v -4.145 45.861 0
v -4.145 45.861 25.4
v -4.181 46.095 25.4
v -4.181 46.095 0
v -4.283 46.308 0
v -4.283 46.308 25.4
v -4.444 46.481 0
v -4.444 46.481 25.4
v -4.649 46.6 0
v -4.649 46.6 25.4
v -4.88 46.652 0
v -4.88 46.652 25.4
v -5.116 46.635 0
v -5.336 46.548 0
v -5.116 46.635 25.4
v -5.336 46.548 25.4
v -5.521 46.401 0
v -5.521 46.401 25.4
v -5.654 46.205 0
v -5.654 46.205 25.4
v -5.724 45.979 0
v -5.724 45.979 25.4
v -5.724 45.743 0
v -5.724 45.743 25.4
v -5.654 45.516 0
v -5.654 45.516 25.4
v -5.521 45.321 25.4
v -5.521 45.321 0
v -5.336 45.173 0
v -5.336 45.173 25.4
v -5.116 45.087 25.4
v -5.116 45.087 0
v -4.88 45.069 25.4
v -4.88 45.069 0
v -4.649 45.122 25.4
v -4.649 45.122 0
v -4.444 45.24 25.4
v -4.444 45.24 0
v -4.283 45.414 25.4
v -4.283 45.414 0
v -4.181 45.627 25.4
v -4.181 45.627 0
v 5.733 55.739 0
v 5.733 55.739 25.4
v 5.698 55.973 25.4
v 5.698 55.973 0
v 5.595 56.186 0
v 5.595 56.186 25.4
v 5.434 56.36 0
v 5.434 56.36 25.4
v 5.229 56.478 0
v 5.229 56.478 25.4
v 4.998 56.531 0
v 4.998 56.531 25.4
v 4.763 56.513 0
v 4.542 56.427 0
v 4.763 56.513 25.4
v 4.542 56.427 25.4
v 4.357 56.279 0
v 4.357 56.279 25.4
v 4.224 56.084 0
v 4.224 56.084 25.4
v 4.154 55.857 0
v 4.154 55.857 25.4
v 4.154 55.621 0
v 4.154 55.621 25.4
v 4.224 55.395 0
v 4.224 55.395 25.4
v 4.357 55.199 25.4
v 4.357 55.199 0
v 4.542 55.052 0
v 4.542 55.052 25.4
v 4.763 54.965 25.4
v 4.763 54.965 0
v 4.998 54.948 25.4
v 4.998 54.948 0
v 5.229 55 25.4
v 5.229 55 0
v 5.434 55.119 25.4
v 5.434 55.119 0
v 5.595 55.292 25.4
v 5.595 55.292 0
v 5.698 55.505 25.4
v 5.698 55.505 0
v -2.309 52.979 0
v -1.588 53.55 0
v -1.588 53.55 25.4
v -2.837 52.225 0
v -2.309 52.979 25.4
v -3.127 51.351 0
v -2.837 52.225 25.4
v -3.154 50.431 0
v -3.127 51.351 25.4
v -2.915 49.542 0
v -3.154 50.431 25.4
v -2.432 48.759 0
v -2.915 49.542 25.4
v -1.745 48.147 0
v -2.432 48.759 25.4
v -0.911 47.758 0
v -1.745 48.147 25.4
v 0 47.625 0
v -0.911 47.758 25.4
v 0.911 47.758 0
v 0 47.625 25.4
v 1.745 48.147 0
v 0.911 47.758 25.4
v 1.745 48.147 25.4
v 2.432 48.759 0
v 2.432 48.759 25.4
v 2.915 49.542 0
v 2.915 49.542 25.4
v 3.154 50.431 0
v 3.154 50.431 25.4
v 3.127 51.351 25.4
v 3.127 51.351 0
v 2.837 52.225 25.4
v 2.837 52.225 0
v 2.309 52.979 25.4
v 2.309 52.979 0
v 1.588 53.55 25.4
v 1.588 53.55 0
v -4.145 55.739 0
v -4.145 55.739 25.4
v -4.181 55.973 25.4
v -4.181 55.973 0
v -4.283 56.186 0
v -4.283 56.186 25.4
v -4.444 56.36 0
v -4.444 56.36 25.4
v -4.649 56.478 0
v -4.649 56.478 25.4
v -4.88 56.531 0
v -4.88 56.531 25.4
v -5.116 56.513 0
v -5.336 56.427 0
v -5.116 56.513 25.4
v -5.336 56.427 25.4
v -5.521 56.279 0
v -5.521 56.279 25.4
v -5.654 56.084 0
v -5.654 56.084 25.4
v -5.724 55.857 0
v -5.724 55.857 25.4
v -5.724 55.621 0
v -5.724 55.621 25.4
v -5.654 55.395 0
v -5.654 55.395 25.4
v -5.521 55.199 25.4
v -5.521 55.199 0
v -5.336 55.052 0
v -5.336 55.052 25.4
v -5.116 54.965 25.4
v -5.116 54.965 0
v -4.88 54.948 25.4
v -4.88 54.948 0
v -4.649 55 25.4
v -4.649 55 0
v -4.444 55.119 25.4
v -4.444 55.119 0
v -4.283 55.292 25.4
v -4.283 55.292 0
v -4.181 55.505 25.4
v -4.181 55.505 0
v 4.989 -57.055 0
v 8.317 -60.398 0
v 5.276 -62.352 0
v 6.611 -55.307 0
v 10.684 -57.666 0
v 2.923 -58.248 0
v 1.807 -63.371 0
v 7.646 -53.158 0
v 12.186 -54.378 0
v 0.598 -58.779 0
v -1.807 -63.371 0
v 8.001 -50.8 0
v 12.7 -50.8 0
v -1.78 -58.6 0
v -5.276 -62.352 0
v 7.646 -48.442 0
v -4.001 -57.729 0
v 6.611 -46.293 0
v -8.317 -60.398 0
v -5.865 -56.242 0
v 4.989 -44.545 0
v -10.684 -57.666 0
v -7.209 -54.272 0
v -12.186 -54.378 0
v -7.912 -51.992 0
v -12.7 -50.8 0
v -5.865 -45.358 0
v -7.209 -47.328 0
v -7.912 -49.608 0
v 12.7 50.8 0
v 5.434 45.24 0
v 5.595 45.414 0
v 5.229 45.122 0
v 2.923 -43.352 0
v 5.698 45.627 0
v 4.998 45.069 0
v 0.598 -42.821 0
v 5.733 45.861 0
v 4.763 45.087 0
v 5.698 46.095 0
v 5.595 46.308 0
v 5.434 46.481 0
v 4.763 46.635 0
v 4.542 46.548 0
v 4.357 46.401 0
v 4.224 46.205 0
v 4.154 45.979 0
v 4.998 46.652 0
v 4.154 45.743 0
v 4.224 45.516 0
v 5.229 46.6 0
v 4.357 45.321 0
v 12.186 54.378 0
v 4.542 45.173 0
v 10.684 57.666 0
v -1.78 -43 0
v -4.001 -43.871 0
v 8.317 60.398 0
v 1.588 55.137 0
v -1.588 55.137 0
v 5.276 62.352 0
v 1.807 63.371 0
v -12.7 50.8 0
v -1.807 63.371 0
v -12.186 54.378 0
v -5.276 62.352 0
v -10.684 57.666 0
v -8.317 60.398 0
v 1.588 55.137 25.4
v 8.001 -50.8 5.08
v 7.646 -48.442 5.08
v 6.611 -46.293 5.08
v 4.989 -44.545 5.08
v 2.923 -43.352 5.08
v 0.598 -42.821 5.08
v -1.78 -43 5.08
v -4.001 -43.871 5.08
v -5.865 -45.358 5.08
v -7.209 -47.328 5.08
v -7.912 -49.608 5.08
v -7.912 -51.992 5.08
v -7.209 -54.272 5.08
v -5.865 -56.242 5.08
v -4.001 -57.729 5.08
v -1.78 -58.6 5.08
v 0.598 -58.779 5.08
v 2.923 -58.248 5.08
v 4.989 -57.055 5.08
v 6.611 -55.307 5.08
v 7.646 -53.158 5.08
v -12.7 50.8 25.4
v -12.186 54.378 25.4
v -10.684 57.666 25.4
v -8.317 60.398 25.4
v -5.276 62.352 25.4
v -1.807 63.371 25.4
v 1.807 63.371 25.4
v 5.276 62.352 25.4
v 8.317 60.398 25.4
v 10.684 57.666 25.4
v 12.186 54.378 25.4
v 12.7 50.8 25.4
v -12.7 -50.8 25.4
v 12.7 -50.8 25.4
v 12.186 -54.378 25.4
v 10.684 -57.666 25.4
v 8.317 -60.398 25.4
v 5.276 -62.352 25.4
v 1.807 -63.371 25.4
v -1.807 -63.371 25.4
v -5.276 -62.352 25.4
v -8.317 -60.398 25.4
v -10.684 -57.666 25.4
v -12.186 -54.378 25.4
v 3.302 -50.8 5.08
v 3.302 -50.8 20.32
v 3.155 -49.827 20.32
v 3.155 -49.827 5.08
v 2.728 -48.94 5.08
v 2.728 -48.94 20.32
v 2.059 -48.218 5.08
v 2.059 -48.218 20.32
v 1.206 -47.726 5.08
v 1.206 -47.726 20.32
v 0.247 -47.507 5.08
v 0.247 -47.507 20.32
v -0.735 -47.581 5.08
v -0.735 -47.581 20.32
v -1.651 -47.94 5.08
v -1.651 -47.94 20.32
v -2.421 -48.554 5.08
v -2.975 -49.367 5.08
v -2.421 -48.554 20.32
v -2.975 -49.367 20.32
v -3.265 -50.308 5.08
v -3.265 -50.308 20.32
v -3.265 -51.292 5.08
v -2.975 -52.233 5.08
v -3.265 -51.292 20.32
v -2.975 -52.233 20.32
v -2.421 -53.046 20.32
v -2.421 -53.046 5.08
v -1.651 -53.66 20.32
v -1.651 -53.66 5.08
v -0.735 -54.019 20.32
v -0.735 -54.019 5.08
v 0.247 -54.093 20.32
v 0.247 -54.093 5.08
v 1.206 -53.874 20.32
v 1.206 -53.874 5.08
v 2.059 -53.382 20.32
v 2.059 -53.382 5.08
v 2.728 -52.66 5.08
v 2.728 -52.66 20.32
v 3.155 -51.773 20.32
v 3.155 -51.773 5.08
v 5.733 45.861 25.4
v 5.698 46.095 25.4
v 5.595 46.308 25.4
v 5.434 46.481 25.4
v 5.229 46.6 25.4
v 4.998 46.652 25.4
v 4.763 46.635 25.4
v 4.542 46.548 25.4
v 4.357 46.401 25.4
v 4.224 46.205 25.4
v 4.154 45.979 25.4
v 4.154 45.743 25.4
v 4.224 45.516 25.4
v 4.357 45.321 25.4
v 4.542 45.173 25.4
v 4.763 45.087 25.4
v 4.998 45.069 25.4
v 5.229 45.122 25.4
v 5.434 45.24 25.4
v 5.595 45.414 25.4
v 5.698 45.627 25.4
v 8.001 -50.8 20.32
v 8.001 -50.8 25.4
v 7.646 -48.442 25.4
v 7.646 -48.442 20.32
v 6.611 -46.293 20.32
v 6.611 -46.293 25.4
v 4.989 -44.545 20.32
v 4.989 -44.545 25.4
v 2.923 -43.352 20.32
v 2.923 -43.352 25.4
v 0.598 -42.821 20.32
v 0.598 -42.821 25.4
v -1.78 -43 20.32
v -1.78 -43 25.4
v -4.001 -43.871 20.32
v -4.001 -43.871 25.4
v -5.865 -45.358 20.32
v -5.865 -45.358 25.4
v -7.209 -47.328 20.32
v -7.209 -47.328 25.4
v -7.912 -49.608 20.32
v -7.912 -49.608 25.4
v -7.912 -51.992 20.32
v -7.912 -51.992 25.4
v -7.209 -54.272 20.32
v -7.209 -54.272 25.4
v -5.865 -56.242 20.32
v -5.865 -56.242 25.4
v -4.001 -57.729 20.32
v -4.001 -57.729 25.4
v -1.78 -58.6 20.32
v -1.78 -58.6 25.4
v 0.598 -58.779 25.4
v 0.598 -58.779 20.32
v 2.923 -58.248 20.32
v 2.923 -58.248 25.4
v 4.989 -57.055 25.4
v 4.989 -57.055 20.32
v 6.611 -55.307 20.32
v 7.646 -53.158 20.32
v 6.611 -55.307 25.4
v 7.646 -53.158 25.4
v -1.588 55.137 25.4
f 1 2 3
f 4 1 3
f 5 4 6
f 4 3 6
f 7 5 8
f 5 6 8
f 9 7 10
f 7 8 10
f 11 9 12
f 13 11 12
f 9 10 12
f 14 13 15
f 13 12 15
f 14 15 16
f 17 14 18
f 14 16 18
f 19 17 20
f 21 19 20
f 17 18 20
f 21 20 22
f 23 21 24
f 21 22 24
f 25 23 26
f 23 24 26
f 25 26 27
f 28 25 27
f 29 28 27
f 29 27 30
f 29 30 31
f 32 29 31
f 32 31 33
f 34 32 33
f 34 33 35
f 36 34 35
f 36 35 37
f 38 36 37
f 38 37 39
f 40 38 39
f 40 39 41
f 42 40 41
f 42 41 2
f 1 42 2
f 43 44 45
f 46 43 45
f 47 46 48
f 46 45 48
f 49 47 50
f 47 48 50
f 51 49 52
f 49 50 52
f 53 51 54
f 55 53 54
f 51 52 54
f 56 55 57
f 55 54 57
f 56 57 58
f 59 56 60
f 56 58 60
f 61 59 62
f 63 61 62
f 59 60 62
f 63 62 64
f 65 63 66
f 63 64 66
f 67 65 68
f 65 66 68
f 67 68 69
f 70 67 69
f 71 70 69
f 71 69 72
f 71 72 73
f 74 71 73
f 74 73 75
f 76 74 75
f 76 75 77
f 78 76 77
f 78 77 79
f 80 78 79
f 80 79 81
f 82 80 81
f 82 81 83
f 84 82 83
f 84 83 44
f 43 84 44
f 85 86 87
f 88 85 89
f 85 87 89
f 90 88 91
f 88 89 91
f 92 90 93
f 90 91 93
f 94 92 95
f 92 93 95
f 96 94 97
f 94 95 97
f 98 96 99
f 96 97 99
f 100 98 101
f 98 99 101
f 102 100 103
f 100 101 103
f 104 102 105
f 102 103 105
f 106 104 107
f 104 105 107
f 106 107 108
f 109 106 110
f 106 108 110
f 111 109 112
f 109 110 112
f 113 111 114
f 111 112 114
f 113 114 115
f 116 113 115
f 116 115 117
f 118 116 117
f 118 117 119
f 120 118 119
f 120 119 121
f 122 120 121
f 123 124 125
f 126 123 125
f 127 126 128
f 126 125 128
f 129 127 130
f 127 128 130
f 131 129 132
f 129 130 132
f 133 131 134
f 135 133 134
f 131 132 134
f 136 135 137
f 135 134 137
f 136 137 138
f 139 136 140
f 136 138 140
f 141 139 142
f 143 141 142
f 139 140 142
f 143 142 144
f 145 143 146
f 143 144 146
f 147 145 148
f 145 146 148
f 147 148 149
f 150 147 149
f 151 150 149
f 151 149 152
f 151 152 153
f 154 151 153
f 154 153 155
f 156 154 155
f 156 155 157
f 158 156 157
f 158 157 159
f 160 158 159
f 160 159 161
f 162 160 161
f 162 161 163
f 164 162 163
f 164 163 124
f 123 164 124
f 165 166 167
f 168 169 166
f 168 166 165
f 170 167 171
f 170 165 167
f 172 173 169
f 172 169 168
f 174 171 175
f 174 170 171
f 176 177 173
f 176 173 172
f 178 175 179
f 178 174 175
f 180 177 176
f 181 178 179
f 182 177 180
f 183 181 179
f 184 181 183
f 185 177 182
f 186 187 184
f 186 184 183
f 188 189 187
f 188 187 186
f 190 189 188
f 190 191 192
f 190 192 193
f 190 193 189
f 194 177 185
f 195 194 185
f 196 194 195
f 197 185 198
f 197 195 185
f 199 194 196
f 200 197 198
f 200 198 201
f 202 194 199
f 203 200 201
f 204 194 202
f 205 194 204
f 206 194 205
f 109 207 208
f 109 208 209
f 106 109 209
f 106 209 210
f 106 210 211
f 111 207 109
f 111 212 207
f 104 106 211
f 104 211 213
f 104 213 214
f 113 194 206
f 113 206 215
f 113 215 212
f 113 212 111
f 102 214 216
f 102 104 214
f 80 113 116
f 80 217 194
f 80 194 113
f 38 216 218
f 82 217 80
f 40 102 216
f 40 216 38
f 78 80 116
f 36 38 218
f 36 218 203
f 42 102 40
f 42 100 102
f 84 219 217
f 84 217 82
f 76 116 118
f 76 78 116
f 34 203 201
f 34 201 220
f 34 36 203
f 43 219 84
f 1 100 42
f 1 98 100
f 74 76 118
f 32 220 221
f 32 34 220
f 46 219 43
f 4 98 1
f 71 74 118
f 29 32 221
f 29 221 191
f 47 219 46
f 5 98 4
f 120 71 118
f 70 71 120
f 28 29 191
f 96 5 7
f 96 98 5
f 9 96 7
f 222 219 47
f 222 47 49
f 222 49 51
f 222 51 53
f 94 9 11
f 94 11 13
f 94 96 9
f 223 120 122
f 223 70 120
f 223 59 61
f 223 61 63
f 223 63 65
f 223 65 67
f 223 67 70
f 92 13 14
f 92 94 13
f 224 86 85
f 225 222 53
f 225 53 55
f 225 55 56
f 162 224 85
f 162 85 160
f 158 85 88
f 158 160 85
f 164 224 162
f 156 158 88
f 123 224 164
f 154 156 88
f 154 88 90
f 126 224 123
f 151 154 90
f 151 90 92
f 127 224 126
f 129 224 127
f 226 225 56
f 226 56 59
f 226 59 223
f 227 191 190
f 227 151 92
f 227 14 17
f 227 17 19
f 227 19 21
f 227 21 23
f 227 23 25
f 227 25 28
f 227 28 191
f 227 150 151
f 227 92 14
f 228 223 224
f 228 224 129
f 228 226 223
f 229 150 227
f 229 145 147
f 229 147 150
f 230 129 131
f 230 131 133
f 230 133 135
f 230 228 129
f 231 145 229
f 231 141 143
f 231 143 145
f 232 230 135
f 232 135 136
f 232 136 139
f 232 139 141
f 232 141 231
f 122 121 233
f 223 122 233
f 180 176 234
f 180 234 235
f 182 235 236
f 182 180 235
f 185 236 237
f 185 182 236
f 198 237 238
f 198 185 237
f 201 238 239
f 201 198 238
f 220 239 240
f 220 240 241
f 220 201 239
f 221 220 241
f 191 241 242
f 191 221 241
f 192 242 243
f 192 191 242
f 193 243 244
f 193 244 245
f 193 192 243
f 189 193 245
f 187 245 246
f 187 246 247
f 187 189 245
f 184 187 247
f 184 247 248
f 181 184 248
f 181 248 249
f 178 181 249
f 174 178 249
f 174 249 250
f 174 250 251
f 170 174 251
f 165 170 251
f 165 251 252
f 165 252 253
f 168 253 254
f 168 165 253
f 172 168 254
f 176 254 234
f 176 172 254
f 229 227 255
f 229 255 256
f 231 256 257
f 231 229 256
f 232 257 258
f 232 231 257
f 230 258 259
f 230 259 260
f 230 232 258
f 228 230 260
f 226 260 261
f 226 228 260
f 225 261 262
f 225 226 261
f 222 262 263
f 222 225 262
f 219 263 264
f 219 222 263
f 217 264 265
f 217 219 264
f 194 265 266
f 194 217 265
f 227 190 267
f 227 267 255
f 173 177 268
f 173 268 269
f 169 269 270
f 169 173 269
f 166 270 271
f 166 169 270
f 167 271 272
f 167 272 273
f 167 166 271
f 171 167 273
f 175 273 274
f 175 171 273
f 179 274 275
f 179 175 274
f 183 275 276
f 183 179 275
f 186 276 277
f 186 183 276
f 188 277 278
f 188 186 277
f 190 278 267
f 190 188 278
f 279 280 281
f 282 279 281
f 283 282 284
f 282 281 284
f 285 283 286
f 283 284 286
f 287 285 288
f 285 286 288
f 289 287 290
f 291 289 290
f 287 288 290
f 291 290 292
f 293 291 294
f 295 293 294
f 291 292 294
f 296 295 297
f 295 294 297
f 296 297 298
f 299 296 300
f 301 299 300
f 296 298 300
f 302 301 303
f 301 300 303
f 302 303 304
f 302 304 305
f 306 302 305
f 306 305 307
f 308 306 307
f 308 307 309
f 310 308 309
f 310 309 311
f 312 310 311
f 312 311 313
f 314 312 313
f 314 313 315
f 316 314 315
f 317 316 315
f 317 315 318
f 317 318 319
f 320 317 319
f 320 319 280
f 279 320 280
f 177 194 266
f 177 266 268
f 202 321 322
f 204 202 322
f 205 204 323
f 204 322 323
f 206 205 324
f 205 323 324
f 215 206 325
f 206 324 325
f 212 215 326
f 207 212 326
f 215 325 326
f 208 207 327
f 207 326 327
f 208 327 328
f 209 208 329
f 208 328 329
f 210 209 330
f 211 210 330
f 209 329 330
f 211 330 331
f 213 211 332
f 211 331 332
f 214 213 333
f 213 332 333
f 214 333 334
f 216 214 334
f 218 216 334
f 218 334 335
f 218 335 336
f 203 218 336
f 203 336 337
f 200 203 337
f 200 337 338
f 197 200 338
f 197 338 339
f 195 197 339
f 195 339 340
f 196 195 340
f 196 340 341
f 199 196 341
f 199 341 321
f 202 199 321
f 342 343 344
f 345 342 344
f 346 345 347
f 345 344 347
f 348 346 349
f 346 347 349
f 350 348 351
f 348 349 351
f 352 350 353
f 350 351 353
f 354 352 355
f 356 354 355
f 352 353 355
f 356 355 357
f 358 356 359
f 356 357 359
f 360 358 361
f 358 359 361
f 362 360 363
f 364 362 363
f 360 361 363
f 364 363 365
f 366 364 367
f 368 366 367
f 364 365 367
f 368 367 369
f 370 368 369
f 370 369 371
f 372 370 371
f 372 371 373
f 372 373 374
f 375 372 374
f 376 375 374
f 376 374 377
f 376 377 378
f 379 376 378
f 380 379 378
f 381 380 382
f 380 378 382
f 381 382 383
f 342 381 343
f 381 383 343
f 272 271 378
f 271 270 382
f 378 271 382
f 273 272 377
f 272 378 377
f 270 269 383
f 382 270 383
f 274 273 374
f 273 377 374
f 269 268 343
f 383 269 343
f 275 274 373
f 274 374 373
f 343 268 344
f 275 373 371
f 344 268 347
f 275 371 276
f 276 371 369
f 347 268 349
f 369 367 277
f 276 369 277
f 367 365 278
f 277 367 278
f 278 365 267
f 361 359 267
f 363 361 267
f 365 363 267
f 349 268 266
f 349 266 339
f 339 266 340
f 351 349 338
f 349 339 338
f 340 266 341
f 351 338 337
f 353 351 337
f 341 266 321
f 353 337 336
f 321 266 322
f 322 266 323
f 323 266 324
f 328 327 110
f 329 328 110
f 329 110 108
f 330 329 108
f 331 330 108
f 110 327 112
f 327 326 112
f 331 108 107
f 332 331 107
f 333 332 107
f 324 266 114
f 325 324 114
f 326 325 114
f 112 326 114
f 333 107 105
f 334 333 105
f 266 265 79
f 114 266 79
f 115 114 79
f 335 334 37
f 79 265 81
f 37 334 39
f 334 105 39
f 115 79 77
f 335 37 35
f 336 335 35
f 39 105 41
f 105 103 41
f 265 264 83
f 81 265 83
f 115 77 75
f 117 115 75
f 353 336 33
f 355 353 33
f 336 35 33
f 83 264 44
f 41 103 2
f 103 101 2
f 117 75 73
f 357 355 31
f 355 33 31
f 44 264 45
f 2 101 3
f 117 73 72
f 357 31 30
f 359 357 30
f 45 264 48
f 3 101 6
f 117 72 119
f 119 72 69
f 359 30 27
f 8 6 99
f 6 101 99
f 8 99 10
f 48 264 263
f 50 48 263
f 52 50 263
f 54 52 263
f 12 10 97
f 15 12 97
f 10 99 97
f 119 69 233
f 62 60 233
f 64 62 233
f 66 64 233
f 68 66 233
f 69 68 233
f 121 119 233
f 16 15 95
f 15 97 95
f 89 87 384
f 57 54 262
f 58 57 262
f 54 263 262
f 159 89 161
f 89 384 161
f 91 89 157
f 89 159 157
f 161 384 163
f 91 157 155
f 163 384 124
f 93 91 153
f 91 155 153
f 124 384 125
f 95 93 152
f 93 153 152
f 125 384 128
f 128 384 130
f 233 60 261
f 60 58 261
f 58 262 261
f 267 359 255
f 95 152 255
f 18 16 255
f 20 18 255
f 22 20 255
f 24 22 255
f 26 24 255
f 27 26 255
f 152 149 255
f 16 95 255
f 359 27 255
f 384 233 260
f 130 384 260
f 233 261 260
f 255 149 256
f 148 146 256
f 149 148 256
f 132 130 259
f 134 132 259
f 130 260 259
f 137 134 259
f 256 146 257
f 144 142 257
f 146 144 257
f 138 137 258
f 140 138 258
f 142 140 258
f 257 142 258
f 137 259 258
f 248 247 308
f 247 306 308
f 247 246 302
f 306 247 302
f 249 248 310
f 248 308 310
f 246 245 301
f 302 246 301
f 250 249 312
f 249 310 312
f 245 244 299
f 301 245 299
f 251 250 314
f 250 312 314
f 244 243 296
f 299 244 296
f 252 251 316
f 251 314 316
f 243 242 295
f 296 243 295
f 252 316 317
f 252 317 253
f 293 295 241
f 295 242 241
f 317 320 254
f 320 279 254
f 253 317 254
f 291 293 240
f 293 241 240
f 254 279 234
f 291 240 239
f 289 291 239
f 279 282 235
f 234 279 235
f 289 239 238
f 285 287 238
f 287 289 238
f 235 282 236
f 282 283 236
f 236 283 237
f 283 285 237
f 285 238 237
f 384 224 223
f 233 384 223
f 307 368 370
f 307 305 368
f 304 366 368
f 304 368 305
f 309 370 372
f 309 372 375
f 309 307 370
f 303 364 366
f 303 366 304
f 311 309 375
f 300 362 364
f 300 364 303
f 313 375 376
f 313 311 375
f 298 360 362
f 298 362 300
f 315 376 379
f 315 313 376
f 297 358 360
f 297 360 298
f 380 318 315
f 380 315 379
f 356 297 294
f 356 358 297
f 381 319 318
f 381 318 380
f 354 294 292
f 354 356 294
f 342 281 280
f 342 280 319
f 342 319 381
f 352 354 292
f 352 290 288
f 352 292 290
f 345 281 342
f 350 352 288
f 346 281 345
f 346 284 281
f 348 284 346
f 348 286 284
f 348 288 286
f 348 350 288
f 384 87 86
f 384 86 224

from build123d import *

# Parameters (mm, degrees)
BOSS_EXTRUDE1_DEPTH = 25.4
CUT_EXTRUDE1_REACH  = 71.561
SKETCH2_R           = 3.175
SKETCH2_R_2         = 0.79375
SKETCH3_W           = 3.175
SKETCH3_H           = 1.5875
CUT_EXTRUDE2_DEPTH  = 70.560764803
SKETCH4_R           = 8.001
CUT_EXTRUDE3_DEPTH  = 5.08
SKETCH5_R           = 3.302
CUT_EXTRUDE4_DEPTH  = 68.870777217


with BuildPart() as part:
    # Sketch1 → Boss-Extrude1 (new body)
    with BuildSketch(Plane.XY):
        with BuildLine():
            Line((12.7, 50.8), (12.7, -50.8))
            ThreePointArc((12.7, -50.8), (0, -63.5), (-12.7, -50.8))
            Line((-12.7, -50.8), (-12.7, 50.8))
            ThreePointArc((-12.7, 50.8), (0, 63.5), (12.7, 50.8))
        make_face()
    extrude(amount=BOSS_EXTRUDE1_DEPTH)

    # Sketch2 → Cut-Extrude1 (cut, up to next)
    with BuildSketch(Plane.XY.offset(25.4), mode=Mode.PRIVATE) as cut_extrude1_sk1:
        with Locations((0, 50.8)):
            Circle(SKETCH2_R)
    cut_extrude1_tool1 = extrude(cut_extrude1_sk1.sketch, amount=-CUT_EXTRUDE1_REACH, mode=Mode.PRIVATE) & part.part
    # Sketch2 → Cut-Extrude1 (cut, up to next)
    with BuildSketch(Plane.XY.offset(25.4), mode=Mode.PRIVATE) as cut_extrude1_sk2:
        with Locations((-4.939140867, 55.739140867)):
            Circle(SKETCH2_R_2)
    cut_extrude1_tool2 = extrude(cut_extrude1_sk2.sketch, amount=-CUT_EXTRUDE1_REACH, mode=Mode.PRIVATE) & part.part
    # Sketch2 → Cut-Extrude1 (cut, up to next)
    with BuildSketch(Plane.XY.offset(25.4), mode=Mode.PRIVATE) as cut_extrude1_sk3:
        with Locations((-4.939140867, 45.860859133)):
            Circle(SKETCH2_R_2)
    cut_extrude1_tool3 = extrude(cut_extrude1_sk3.sketch, amount=-CUT_EXTRUDE1_REACH, mode=Mode.PRIVATE) & part.part
    # Sketch2 → Cut-Extrude1 (cut, up to next)
    with BuildSketch(Plane.XY.offset(25.4), mode=Mode.PRIVATE) as cut_extrude1_sk4:
        with Locations((4.939140867, 55.739140867)):
            Circle(SKETCH2_R_2)
    cut_extrude1_tool4 = extrude(cut_extrude1_sk4.sketch, amount=-CUT_EXTRUDE1_REACH, mode=Mode.PRIVATE) & part.part
    # Sketch2 → Cut-Extrude1 (cut, up to next)
    with BuildSketch(Plane.XY.offset(25.4), mode=Mode.PRIVATE) as cut_extrude1_sk5:
        with Locations((4.939140867, 45.860859133)):
            Circle(SKETCH2_R_2)
    cut_extrude1_tool5 = extrude(cut_extrude1_sk5.sketch, amount=-CUT_EXTRUDE1_REACH, mode=Mode.PRIVATE) & part.part
    add(cut_extrude1_tool1.solids().sort_by_distance((0, 50.8, 25.4))[0], mode=Mode.SUBTRACT)
    add(cut_extrude1_tool2.solids().sort_by_distance((-4.939141, 55.739141, 25.4))[0], mode=Mode.SUBTRACT)
    add(cut_extrude1_tool3.solids().sort_by_distance((-4.939141, 45.860859, 25.4))[0], mode=Mode.SUBTRACT)
    add(cut_extrude1_tool4.solids().sort_by_distance((4.939141, 55.739141, 25.4))[0], mode=Mode.SUBTRACT)
    add(cut_extrude1_tool5.solids().sort_by_distance((4.939141, 45.860859, 25.4))[0], mode=Mode.SUBTRACT)

    # Sketch3 → Cut-Extrude2 (cut, through all)
    with BuildSketch(Plane.XY.offset(25.4)):
        with Locations((0, 54.343380657)):
            Rectangle(SKETCH3_W, SKETCH3_H)
    extrude(amount=-CUT_EXTRUDE2_DEPTH, mode=Mode.SUBTRACT)

    # Sketch4 → Cut-Extrude3 (cut)
    with BuildSketch(Plane.XY.offset(25.4)):
        with Locations((0, -50.8)):
            Circle(SKETCH4_R)
    cut_extrude3 = extrude(amount=-CUT_EXTRUDE3_DEPTH, mode=Mode.SUBTRACT)

    # Mirror1: Cut-Extrude3 across plane
    add(cut_extrude3.mirror(Plane.XY.offset(12.7)), mode=Mode.SUBTRACT)

    # Sketch5 → Cut-Extrude4 (cut, through all)
    with BuildSketch(Plane.XY.offset(20.32)):
        with Locations((0, -50.8)):
            Circle(SKETCH5_R)
    extrude(amount=-CUT_EXTRUDE4_DEPTH, mode=Mode.SUBTRACT)


solid = part.part
